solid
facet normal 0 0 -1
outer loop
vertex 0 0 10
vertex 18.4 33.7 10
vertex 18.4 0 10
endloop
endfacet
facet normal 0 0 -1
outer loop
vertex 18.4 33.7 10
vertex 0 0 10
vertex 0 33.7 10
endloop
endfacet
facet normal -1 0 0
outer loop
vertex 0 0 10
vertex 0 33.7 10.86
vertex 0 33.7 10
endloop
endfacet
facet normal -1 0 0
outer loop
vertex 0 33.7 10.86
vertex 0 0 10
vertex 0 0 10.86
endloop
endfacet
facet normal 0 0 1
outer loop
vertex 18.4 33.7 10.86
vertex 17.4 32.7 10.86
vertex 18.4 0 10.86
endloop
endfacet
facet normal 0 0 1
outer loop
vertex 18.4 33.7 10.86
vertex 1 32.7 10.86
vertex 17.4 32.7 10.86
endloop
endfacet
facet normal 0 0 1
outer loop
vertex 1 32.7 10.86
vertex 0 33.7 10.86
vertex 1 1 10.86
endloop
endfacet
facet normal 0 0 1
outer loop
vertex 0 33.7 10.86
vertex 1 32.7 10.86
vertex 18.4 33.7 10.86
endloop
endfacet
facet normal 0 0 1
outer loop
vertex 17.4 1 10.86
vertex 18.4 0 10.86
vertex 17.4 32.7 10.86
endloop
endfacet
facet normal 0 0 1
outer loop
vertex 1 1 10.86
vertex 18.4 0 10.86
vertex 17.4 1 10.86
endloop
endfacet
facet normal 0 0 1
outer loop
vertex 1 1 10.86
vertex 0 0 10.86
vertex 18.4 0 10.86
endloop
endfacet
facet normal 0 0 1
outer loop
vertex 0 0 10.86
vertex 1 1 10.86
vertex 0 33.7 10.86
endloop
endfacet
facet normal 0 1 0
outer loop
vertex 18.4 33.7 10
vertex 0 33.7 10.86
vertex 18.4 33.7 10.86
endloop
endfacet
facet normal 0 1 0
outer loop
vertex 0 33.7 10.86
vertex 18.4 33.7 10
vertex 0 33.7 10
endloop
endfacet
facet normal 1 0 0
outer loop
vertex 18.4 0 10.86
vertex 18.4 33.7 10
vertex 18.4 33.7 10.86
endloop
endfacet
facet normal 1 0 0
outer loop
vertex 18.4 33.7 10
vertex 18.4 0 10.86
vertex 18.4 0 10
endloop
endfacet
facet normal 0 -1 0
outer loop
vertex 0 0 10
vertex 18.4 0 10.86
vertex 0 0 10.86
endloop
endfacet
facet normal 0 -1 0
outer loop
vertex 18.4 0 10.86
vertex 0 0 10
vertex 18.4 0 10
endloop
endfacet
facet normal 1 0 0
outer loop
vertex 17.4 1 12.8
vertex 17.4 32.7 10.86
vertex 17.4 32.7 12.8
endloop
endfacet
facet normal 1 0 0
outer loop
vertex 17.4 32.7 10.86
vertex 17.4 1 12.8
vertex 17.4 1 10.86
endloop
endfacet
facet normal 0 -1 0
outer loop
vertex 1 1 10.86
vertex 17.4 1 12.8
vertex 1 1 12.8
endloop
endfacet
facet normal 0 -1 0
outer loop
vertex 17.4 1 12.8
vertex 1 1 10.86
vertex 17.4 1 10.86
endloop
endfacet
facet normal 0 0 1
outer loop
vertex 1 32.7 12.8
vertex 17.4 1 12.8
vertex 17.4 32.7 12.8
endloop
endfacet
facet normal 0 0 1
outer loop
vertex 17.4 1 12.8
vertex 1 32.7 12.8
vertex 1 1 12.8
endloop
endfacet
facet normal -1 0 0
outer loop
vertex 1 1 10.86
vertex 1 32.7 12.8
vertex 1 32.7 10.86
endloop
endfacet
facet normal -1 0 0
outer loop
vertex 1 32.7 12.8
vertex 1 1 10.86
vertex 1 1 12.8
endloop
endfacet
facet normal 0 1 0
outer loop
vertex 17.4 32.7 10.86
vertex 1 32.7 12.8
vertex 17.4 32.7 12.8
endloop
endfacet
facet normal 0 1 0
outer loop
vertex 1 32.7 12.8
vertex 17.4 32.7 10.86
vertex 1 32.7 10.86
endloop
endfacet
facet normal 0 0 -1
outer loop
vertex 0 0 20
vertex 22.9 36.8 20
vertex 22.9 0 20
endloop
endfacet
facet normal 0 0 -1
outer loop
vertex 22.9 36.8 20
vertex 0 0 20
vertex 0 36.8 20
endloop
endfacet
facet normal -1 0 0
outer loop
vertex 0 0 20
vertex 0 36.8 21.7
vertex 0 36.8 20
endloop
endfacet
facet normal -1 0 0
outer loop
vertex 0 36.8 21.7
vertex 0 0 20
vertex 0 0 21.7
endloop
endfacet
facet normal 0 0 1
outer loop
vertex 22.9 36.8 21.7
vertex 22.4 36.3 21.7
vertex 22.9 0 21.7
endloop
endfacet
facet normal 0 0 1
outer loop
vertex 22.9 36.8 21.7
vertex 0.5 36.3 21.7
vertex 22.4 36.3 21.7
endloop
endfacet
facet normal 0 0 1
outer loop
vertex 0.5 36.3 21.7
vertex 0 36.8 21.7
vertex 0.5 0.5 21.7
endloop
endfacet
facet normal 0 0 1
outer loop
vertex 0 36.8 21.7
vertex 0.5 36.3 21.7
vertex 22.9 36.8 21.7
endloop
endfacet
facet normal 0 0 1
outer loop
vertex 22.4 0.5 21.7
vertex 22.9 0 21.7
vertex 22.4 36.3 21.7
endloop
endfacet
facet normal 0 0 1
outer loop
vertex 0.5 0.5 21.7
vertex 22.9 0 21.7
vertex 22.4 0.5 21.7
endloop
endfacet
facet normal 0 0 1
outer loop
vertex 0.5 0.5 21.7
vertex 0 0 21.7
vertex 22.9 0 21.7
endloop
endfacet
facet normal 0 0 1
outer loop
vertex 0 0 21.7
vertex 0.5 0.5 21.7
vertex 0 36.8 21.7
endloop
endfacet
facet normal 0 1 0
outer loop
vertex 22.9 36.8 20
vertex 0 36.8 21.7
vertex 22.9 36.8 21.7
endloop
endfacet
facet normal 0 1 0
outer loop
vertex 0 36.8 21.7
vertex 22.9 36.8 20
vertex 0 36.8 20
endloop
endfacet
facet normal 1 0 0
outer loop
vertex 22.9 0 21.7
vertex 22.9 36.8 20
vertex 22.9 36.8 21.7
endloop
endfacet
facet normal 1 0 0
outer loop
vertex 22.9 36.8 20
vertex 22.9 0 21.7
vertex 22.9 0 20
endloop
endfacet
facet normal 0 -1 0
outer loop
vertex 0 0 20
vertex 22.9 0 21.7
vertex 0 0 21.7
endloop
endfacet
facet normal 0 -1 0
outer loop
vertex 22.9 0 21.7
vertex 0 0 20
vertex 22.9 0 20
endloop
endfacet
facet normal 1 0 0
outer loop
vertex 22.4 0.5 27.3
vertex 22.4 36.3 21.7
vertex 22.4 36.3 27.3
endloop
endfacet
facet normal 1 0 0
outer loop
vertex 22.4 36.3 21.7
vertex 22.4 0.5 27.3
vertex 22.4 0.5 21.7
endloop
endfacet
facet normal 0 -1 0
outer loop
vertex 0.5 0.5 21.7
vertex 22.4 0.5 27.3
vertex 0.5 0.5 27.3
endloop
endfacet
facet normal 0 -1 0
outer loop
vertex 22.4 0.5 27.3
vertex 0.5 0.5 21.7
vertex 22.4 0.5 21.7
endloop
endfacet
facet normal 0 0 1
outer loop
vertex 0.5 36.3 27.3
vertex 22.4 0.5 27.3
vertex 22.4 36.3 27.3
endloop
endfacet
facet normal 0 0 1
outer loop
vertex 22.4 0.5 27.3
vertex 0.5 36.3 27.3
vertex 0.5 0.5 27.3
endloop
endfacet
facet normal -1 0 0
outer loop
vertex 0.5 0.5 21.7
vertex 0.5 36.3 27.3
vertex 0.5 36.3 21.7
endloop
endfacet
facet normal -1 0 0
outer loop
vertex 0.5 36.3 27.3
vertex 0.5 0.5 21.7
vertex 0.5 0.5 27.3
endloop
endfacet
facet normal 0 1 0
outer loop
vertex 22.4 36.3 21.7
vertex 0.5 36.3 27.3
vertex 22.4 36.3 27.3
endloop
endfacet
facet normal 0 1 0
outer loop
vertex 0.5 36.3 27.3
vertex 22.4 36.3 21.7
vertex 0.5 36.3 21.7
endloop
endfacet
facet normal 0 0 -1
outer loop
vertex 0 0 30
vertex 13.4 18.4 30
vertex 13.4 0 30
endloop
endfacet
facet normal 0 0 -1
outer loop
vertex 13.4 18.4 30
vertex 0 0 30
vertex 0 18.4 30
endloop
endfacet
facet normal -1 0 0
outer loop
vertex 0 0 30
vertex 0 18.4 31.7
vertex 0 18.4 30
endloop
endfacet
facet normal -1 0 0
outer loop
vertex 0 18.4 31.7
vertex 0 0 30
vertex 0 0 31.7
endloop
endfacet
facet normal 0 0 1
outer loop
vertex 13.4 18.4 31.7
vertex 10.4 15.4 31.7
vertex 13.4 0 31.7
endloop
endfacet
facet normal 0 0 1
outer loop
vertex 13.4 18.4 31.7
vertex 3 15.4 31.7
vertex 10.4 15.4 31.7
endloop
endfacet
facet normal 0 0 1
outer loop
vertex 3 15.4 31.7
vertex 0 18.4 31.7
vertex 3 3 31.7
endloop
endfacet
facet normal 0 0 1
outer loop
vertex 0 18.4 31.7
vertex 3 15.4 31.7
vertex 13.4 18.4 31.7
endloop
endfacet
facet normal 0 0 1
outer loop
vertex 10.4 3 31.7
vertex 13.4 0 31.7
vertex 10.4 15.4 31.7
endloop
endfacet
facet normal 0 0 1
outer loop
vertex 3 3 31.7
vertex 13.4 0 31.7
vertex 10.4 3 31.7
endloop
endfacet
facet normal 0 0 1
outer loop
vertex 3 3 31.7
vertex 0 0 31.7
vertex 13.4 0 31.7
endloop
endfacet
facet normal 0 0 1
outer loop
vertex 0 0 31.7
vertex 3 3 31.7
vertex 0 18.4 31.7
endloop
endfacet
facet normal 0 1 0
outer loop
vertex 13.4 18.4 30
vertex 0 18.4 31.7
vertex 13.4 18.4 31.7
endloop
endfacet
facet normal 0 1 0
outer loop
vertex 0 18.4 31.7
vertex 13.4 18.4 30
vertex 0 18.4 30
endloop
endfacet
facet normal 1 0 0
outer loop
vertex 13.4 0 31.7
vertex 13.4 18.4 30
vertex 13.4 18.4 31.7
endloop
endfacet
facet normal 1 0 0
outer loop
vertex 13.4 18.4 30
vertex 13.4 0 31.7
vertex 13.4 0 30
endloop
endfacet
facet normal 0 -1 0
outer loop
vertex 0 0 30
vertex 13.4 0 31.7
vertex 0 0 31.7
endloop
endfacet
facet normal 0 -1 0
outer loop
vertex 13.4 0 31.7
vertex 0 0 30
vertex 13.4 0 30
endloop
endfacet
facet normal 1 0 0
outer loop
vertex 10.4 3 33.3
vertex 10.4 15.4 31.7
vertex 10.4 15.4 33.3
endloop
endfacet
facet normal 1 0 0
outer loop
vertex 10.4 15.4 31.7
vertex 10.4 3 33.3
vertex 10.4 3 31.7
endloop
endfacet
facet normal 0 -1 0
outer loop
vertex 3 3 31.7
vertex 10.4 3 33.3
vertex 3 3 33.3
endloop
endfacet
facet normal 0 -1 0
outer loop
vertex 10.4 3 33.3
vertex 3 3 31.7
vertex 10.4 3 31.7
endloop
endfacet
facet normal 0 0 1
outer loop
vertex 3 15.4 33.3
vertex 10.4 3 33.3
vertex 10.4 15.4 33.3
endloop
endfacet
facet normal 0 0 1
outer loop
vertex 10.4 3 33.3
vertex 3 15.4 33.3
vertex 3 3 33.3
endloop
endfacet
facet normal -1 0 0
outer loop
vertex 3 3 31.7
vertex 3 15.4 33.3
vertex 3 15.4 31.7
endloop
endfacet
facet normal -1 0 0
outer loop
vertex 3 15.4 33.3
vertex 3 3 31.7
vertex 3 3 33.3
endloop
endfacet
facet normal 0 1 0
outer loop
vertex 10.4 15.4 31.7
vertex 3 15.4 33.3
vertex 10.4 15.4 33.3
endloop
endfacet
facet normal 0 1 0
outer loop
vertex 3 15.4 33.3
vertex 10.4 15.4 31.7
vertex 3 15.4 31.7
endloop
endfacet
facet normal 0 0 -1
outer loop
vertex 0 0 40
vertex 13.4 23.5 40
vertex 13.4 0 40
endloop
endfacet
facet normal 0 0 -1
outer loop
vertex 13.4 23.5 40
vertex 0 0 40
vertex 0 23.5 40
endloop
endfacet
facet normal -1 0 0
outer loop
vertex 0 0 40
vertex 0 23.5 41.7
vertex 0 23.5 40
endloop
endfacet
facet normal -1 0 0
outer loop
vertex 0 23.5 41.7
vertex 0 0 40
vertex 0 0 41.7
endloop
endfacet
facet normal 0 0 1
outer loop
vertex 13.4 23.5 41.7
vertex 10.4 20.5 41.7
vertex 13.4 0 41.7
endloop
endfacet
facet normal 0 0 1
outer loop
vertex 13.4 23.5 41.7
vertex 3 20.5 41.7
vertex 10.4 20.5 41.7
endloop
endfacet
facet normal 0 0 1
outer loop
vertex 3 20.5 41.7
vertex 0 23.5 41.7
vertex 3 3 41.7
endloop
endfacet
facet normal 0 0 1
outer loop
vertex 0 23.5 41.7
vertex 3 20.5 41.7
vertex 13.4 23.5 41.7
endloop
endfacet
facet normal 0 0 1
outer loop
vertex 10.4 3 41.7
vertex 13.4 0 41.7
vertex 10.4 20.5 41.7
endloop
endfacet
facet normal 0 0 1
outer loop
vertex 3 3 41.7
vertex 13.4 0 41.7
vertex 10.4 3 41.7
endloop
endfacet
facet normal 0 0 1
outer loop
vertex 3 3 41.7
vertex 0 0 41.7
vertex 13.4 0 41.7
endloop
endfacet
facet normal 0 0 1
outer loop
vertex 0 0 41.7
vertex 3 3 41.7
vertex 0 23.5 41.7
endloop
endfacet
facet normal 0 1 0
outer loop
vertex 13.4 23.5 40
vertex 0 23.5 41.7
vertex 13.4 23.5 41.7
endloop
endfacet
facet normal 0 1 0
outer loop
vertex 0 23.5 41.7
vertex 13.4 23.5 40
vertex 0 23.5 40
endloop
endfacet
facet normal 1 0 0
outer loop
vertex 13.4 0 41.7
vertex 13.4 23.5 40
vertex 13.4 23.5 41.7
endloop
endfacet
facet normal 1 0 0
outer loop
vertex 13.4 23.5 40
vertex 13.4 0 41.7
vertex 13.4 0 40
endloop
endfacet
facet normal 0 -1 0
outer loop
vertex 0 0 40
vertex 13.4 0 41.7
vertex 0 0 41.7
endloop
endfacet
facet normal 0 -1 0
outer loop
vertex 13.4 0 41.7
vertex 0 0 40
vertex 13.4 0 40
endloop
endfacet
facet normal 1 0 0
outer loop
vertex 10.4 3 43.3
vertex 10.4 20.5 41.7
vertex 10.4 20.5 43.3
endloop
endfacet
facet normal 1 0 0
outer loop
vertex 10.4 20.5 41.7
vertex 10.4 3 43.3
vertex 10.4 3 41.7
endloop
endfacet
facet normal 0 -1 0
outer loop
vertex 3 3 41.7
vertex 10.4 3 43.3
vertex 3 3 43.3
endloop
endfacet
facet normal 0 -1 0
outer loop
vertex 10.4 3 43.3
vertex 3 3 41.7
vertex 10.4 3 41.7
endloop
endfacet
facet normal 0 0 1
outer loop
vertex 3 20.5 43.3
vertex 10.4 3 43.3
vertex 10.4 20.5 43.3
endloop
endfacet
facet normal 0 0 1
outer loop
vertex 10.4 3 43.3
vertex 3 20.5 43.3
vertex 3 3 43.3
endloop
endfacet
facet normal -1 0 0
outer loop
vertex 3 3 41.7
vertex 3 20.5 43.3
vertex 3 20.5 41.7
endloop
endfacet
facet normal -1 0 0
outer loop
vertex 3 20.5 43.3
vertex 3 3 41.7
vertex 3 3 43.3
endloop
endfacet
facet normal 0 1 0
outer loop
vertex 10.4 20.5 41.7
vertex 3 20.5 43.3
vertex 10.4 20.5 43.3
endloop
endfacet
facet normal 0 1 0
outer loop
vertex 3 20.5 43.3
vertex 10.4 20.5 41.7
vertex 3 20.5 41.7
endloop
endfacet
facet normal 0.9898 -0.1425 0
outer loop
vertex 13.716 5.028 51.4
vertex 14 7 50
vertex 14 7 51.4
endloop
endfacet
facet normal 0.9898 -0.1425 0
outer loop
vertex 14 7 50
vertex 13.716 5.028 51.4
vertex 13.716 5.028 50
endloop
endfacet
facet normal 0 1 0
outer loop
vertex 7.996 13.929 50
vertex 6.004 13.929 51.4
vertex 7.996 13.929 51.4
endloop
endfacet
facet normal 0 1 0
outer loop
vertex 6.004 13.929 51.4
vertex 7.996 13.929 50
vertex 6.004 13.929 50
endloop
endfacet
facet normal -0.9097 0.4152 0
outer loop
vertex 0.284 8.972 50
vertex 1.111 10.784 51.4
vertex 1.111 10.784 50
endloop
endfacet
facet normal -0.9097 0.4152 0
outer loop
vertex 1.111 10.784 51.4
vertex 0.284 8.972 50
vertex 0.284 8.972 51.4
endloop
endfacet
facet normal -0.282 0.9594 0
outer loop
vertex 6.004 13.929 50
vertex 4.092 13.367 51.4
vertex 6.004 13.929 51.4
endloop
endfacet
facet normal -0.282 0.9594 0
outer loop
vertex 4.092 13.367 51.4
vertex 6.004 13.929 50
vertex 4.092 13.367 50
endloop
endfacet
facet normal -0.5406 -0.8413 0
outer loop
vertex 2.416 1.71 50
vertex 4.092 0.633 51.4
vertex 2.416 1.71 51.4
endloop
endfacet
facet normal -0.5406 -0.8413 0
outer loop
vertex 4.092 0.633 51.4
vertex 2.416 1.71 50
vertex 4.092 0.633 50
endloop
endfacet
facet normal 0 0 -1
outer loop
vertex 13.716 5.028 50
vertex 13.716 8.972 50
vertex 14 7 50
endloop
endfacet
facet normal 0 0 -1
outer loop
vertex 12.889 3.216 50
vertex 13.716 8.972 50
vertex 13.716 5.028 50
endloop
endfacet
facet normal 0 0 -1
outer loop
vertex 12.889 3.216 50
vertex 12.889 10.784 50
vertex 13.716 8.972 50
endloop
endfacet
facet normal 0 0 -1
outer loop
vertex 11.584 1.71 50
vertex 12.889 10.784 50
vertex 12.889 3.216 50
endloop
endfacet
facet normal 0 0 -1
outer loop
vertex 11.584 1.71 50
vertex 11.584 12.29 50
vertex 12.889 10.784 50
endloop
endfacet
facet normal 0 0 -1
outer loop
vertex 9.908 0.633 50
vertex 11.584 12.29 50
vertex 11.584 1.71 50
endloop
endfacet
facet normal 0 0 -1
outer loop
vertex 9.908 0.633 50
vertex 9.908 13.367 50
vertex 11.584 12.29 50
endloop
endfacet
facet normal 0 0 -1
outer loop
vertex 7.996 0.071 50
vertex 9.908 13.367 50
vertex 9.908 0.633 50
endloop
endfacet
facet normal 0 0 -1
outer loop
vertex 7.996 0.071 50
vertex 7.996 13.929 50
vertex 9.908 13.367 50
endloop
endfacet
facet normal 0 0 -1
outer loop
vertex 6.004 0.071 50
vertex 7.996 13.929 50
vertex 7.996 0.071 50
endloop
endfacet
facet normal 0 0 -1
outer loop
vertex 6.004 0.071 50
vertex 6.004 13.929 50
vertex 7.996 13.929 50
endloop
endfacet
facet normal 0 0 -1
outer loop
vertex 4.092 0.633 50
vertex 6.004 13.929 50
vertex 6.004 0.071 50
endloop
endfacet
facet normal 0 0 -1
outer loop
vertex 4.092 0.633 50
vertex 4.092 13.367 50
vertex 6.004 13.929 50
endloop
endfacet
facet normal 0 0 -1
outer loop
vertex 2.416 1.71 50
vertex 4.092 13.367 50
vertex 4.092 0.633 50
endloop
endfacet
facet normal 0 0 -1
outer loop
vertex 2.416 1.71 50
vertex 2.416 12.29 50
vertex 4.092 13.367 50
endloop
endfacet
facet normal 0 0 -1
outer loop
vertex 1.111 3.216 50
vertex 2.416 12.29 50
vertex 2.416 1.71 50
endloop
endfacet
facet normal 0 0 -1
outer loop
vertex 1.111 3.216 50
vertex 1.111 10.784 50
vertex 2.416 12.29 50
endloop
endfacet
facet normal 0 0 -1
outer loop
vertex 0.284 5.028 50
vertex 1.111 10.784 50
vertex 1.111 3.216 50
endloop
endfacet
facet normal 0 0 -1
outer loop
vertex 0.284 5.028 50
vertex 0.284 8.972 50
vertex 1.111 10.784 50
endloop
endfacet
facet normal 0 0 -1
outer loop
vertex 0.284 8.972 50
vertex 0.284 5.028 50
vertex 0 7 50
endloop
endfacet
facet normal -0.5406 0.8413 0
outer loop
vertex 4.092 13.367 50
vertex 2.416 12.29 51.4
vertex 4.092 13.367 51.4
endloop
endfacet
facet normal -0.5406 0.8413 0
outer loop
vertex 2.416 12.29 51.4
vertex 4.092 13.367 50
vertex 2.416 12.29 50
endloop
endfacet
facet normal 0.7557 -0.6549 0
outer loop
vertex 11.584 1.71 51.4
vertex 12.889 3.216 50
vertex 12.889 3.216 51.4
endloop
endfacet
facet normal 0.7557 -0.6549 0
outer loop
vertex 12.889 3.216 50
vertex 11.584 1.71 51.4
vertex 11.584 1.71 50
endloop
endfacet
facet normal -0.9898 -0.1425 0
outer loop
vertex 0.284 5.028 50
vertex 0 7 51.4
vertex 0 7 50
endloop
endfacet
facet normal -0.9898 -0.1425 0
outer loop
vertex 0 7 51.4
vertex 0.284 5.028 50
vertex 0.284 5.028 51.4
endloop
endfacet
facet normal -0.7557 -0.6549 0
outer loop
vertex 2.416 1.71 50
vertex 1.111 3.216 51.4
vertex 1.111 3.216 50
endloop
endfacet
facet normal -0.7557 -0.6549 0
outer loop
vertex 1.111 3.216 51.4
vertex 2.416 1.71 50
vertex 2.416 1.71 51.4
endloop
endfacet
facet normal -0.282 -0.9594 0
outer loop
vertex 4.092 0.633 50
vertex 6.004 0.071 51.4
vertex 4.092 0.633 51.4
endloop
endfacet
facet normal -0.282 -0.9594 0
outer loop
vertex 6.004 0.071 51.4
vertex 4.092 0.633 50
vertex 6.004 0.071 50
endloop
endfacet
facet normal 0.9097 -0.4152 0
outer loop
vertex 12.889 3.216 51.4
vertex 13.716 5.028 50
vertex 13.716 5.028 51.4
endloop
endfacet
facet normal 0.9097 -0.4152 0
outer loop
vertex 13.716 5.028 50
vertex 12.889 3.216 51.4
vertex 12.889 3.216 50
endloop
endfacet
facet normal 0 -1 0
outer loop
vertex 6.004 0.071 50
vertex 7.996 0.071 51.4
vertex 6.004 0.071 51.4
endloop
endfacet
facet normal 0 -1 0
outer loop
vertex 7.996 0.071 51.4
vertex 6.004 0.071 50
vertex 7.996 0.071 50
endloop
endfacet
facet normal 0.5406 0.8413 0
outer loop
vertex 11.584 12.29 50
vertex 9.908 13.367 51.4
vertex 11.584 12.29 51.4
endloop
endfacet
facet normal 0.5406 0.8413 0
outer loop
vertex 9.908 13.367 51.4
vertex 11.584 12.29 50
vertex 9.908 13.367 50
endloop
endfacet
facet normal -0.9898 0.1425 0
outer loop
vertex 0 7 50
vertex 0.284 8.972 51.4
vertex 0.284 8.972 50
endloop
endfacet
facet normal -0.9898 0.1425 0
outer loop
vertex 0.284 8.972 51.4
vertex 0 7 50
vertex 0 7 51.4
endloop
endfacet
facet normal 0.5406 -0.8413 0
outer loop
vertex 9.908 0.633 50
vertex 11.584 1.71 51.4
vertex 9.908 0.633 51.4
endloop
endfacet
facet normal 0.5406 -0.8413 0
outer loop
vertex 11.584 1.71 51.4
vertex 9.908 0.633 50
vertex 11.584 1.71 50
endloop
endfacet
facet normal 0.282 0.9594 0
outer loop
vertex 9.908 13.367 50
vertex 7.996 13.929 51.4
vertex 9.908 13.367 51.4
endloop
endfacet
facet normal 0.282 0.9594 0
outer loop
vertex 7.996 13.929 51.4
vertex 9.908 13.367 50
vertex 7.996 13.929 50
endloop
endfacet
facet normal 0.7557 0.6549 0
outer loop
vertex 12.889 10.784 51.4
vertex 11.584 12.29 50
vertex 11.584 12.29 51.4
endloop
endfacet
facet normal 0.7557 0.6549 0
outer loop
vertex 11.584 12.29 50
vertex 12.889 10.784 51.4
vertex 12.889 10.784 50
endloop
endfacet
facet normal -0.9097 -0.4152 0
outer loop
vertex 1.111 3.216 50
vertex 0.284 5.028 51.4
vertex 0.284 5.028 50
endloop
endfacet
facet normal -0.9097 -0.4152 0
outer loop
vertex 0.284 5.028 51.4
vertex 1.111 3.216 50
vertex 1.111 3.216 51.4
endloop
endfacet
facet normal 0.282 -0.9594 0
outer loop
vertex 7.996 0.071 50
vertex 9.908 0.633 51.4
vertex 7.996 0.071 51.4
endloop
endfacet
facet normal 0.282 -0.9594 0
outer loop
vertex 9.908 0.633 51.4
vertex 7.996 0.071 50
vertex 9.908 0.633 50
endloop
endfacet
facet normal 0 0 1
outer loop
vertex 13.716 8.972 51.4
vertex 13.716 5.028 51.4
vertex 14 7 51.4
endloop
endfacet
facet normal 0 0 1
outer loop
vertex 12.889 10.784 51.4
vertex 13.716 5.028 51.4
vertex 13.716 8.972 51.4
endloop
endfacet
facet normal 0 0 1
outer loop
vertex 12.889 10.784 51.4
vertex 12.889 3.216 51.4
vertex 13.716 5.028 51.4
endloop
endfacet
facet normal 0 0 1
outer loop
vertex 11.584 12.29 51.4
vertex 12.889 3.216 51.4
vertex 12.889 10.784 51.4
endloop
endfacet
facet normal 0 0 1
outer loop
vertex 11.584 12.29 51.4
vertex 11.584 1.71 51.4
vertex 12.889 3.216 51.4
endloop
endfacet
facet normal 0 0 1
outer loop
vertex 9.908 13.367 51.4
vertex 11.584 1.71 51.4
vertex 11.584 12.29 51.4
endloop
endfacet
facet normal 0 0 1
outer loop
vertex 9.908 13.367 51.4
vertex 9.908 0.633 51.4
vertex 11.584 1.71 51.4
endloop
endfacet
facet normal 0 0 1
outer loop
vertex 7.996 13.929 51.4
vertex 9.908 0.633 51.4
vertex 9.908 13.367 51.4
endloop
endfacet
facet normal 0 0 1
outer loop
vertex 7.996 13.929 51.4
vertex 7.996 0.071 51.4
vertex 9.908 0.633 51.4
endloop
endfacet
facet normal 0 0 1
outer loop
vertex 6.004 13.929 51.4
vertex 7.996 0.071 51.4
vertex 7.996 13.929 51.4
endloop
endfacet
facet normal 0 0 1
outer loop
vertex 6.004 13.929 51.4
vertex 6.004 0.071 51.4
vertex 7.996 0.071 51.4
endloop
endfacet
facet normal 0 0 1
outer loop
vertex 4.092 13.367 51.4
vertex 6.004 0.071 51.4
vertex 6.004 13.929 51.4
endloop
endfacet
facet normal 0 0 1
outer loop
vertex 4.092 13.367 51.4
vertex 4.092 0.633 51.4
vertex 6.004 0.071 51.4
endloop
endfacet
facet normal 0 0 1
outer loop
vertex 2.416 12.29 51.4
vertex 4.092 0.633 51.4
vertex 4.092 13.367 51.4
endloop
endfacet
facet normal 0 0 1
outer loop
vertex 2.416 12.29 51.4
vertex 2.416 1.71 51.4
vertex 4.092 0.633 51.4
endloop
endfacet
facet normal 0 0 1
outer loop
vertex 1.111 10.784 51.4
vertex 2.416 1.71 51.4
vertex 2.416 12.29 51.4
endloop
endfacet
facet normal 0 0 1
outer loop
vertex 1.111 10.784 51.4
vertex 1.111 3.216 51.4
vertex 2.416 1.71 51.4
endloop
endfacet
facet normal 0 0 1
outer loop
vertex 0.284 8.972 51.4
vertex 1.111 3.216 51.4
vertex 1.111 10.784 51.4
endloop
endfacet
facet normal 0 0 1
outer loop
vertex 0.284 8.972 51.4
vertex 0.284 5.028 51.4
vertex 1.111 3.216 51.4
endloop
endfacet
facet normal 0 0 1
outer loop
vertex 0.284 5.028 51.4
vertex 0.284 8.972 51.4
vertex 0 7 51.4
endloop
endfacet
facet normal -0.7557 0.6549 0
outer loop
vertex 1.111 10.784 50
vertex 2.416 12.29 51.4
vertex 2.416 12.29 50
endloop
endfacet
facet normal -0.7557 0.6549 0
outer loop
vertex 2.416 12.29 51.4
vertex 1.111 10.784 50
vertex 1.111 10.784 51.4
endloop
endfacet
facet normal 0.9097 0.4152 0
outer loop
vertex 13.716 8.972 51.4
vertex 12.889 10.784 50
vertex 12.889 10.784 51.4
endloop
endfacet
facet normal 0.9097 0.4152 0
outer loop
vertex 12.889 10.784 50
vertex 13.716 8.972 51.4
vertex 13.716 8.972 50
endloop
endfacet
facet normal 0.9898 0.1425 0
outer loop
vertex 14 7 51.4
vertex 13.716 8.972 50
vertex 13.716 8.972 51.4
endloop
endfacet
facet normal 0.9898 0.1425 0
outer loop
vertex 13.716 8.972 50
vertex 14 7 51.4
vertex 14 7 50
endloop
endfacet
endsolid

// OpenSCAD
// Pro Mini
translate([0,0,10]) color("red"){
    linear_extrude(height=0.86) 
     square(size=[18.4, 33.7]);

    linear_extrude(height=2.8) 
     offset(r=-1)
     square(size=[18.4, 33.7]);
}

// Adafruit PowerBoost 1000c
translate([0,0,20]) color("blue"){
    linear_extrude(height=1.7) 
     square(size=[22.9, 36.8]);

    linear_extrude(height=7.3) 
     offset(r=-0.5)
      square(size=[22.9, 36.8]);
}

// TXB0104 Level Shifter
translate([0,0,30]) color("green") {
    linear_extrude(height=1.7) 
     square(size=[13.4, 18.4]);
        
    linear_extrude(height=3.3) 
     offset(r=-3)
      square(size=[13.4, 18.4]);
 
}

// LIS3DH
translate([0,0,40]) color("yellow") {
    linear_extrude(height=1.7) 
     square(size=[13.4, 23.5]);
        
    linear_extrude(height=3.3) 
     offset(r=-3)
      square(size=[13.4, 23.5]);
 
}

// Piezo
translate([7,7,50]) color("orange") {
    linear_extrude(height=1.4) 
     circle(r=7);
}
